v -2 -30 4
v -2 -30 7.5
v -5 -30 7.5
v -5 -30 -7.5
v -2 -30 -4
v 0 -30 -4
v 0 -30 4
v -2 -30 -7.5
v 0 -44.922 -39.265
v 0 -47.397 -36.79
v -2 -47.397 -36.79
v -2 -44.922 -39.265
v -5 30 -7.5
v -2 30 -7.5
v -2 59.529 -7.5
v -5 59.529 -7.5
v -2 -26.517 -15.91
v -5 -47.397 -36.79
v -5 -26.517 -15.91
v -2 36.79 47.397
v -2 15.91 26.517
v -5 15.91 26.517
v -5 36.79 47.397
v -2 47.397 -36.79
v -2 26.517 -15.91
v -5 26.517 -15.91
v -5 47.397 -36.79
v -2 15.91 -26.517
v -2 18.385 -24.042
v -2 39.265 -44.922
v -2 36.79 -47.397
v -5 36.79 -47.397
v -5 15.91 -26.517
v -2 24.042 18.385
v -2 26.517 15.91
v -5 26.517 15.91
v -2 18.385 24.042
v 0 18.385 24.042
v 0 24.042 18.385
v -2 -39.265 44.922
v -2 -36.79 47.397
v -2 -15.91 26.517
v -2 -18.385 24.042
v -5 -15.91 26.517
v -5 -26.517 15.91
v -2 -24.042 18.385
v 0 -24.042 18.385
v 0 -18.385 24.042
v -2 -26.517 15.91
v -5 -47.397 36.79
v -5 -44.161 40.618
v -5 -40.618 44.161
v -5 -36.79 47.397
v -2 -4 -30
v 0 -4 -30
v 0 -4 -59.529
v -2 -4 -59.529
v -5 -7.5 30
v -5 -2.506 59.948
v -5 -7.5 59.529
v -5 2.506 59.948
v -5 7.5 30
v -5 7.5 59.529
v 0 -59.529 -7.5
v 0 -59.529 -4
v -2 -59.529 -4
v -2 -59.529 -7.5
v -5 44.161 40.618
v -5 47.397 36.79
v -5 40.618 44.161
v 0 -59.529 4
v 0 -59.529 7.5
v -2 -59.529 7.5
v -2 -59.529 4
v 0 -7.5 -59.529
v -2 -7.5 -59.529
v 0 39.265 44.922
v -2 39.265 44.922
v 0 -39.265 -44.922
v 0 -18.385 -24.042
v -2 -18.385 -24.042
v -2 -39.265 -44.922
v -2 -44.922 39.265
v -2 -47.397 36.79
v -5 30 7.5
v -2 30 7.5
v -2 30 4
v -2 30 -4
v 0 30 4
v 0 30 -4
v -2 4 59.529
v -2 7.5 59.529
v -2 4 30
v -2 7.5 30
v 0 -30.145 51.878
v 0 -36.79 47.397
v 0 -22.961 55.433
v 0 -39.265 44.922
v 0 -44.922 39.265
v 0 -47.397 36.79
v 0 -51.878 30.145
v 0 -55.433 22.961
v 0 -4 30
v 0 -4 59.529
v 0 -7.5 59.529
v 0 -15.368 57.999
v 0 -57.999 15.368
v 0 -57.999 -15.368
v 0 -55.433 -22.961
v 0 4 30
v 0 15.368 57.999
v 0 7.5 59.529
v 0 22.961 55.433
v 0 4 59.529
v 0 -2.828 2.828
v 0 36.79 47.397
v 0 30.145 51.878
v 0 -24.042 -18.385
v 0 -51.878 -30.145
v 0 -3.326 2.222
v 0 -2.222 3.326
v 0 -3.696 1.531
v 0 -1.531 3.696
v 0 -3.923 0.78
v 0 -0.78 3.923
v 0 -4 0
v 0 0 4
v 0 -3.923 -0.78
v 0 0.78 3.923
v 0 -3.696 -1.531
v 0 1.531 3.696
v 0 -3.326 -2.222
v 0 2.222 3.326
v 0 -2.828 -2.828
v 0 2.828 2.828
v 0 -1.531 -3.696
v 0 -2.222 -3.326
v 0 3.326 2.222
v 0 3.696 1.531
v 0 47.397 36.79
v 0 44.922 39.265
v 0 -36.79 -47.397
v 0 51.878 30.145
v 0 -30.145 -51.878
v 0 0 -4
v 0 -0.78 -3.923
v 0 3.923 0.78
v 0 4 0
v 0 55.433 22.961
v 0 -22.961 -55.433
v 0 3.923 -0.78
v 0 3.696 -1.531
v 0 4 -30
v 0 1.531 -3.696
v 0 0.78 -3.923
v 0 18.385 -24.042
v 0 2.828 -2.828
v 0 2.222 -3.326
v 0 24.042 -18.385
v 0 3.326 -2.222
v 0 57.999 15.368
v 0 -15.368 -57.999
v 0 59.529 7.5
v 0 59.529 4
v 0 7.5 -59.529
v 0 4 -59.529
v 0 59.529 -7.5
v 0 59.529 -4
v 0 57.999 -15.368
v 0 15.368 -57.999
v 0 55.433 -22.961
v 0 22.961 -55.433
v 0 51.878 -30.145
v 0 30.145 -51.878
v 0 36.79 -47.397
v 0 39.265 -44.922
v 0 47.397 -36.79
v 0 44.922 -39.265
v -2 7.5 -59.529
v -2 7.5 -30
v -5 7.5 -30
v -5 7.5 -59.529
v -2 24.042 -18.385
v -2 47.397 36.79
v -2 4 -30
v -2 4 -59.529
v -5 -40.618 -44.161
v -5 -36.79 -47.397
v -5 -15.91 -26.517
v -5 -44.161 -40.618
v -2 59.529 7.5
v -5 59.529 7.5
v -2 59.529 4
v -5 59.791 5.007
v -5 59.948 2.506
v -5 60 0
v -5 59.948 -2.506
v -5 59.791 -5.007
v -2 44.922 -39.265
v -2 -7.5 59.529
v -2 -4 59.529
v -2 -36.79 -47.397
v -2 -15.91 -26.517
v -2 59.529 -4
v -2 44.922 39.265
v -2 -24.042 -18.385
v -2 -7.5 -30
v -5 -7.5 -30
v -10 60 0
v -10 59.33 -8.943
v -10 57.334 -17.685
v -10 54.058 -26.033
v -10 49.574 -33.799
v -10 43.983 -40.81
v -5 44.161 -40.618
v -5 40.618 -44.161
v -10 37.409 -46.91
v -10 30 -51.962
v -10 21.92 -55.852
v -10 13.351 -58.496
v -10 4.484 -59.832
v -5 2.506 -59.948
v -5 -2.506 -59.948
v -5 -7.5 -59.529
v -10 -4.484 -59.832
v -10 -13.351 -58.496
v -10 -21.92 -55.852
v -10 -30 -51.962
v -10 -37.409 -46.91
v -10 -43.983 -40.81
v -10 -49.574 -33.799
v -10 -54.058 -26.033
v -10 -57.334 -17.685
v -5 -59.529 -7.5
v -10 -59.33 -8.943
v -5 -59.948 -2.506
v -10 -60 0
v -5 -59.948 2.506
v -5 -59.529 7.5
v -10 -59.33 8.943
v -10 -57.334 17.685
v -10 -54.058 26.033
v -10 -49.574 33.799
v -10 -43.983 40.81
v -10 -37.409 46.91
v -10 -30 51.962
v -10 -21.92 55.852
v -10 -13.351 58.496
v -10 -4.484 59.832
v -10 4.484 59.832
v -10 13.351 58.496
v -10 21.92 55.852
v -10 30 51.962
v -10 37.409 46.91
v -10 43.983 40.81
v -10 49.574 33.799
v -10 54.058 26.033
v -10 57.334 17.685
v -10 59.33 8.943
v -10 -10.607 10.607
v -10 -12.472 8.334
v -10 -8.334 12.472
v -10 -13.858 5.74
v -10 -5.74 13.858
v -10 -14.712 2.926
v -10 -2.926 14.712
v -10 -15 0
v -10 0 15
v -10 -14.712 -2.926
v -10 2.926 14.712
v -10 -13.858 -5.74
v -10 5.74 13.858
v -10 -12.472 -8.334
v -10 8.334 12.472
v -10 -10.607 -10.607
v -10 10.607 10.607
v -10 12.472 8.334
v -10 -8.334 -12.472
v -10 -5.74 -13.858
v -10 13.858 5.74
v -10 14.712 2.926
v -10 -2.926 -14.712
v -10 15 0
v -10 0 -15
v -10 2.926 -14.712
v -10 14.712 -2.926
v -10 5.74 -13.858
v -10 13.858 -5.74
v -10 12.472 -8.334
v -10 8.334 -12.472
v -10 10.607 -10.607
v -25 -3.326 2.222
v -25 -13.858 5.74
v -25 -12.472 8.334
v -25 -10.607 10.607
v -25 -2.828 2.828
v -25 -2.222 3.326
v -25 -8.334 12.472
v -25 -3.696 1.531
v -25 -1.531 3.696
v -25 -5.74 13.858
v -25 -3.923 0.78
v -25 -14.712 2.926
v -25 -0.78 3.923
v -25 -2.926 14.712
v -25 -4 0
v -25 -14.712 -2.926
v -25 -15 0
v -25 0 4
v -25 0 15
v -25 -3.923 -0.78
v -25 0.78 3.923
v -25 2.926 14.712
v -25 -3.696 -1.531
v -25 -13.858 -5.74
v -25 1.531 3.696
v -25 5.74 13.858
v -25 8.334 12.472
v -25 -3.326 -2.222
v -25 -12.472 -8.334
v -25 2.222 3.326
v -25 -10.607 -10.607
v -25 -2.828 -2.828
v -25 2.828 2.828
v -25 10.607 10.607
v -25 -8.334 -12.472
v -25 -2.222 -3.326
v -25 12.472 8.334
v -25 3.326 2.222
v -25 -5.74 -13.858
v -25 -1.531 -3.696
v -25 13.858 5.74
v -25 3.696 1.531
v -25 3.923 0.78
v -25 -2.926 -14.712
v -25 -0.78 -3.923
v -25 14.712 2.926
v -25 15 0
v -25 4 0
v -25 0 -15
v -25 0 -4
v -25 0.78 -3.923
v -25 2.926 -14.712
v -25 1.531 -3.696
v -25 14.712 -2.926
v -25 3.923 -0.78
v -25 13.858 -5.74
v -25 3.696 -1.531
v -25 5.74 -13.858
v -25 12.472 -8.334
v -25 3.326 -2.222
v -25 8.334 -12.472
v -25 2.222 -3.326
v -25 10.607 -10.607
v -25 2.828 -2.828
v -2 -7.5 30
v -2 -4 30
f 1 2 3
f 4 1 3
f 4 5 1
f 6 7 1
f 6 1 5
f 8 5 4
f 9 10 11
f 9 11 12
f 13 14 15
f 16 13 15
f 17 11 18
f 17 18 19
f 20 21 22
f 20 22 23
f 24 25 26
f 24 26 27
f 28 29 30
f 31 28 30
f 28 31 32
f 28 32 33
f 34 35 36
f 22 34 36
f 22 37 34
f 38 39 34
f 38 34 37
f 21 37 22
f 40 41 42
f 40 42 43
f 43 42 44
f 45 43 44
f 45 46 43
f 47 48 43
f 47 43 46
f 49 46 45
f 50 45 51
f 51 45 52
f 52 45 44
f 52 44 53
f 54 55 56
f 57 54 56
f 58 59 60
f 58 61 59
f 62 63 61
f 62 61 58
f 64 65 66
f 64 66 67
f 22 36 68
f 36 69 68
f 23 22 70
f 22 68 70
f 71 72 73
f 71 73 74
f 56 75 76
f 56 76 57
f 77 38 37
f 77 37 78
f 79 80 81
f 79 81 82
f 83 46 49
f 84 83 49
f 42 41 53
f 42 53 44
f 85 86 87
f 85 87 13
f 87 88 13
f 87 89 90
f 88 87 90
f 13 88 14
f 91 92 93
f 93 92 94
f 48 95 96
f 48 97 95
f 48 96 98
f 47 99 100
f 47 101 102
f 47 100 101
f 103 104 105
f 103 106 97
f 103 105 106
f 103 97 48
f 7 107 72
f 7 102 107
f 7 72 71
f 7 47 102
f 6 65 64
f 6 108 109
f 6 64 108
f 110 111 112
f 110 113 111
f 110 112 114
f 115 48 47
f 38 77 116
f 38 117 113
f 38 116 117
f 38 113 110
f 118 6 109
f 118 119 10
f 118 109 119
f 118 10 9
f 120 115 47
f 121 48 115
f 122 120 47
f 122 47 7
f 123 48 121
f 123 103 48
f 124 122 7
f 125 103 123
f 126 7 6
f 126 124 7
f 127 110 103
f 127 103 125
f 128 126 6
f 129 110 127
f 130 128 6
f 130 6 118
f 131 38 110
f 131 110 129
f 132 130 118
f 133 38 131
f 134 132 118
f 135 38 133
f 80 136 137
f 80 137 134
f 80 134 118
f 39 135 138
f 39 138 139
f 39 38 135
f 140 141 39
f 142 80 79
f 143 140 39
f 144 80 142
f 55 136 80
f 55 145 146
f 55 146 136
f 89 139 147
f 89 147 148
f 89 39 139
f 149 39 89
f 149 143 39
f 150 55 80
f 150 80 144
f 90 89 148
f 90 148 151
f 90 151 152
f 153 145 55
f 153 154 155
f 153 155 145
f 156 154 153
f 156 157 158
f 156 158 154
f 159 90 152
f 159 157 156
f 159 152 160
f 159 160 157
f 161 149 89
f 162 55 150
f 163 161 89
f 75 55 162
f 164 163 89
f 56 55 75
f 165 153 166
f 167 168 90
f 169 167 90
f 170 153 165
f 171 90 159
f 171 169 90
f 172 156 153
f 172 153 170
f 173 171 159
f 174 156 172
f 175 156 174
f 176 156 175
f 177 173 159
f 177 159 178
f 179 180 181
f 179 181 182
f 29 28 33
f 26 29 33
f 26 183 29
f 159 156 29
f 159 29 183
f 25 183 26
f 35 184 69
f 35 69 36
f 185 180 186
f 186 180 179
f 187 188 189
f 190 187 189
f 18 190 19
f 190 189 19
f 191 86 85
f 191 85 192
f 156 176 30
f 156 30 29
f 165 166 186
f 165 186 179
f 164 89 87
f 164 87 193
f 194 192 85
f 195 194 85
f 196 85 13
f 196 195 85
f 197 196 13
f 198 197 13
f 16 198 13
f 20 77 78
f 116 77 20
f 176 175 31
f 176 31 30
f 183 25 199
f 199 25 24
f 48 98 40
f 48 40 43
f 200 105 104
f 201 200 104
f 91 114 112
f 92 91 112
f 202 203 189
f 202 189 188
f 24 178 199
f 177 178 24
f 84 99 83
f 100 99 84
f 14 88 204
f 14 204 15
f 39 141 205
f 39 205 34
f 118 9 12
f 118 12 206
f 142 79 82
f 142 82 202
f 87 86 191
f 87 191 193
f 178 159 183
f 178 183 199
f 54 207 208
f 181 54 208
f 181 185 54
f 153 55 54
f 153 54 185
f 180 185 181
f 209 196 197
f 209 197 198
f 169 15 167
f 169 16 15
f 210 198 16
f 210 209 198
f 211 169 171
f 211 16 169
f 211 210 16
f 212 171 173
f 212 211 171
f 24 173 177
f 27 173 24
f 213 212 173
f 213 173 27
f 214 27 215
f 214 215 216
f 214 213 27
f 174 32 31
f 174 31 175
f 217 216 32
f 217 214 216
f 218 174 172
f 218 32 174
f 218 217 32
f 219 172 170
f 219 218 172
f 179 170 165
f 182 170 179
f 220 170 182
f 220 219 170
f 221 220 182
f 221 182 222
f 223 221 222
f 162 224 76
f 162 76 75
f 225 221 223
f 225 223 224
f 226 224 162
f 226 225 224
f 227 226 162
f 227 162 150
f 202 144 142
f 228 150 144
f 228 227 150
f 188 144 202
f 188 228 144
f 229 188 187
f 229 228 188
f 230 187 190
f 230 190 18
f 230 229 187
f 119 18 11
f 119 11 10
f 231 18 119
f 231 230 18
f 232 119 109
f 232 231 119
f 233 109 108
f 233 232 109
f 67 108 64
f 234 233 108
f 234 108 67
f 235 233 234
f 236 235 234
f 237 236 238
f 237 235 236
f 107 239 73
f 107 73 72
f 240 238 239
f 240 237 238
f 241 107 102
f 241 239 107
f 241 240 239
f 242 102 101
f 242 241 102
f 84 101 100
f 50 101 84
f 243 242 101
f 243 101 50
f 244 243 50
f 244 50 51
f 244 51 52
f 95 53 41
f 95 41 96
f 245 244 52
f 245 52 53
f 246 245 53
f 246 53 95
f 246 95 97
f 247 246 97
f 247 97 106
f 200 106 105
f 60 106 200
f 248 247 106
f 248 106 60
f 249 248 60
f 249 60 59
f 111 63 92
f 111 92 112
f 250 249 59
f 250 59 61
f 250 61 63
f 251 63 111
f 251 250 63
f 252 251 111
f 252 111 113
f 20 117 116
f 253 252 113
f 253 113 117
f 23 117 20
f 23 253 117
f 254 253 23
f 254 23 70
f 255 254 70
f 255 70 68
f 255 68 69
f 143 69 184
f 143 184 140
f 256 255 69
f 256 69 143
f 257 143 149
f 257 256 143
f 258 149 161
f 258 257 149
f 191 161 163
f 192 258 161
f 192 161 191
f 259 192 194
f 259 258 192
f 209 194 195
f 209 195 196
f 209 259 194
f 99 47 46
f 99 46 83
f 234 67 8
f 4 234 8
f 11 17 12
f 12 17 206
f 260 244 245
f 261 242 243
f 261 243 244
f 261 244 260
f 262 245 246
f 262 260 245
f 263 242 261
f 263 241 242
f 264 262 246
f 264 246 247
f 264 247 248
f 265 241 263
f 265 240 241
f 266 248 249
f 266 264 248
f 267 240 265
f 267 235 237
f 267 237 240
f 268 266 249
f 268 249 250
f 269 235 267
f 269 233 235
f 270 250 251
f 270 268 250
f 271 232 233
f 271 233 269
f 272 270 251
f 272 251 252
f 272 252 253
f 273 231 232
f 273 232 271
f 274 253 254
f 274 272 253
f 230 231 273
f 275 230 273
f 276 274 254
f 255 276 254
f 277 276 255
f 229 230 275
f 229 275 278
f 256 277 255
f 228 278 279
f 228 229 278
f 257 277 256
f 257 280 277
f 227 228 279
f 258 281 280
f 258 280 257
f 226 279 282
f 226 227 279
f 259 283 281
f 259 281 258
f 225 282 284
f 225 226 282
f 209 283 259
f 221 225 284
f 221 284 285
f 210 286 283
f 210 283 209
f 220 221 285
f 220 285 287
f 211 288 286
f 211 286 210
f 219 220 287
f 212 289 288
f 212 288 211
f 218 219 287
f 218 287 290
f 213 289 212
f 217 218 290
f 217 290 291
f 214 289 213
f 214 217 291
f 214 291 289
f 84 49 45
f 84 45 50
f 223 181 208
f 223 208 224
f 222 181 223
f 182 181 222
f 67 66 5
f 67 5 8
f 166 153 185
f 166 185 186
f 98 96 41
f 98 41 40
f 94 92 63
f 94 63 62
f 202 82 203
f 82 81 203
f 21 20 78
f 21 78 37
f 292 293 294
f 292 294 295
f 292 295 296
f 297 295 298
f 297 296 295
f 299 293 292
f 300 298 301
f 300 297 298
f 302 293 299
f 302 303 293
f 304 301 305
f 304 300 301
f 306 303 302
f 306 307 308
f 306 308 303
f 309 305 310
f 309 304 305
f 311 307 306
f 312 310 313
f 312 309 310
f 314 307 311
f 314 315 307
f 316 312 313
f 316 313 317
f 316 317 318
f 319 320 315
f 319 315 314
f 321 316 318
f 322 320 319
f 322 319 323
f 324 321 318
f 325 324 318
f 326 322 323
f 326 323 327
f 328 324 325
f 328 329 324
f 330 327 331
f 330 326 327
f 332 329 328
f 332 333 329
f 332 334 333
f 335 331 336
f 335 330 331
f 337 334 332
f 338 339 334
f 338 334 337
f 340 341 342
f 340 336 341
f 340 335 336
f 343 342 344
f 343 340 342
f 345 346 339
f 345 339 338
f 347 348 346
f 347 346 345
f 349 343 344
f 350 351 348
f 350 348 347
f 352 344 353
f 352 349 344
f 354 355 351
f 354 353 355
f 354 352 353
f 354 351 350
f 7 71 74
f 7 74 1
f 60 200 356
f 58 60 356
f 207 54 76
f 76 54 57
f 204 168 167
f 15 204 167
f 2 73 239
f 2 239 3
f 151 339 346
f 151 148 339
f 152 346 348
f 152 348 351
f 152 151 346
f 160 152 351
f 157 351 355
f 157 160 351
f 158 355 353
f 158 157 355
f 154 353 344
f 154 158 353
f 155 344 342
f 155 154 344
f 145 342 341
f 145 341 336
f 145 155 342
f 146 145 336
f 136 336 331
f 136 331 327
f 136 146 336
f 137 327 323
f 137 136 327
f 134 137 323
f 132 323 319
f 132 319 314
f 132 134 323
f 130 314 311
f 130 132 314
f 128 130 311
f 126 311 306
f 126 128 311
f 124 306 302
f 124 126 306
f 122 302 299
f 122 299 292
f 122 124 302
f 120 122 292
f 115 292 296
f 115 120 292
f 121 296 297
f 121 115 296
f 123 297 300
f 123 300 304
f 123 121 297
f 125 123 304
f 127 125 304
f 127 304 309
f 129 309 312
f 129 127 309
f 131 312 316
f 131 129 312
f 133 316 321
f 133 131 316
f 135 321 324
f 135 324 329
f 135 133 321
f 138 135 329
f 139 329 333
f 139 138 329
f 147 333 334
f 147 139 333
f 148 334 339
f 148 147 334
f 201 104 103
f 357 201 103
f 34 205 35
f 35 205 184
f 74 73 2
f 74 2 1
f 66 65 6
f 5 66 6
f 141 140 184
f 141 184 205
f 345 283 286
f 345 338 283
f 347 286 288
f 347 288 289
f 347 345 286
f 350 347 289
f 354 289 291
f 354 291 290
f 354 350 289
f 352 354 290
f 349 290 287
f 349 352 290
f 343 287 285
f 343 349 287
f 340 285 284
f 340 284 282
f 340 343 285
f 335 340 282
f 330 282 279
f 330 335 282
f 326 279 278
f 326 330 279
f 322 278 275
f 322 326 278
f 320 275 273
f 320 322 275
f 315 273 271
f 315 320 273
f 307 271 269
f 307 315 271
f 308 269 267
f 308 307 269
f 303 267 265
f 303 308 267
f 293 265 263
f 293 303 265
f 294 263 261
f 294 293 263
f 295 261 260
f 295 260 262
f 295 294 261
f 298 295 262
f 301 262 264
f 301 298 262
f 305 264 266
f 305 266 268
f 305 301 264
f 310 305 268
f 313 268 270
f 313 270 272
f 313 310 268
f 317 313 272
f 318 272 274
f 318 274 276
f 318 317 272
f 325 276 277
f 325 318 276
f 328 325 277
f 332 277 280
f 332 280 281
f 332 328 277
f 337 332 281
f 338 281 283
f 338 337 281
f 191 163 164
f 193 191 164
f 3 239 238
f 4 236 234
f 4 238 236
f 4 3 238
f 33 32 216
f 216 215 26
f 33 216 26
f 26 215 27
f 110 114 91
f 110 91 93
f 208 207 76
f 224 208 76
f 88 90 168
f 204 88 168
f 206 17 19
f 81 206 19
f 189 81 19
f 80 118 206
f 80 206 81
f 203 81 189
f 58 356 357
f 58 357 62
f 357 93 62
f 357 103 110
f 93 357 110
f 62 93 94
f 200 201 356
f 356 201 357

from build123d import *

# Parameters (mm, degrees)
SKETCH2_W           = 15
SKETCH2_H           = 30
SKETCH2_W_2         = 30
SKETCH2_H_2         = 15
CUT_EXTRUDE1_DEPTH  = 5
SKETCH3_W           = 29.529404499
SKETCH3_H           = 3.5
SKETCH3_W_2         = 3.5
SKETCH3_H_2         = 29.529404499
BOSS_EXTRUDE1_DEPTH = 2


with BuildPart() as part:
    # Sketch1 → Revolve2 (revolve)
    with BuildSketch(Plane.XY):
        Polygon((0, 4), (0, 60), (-10, 60), (-10, 15), (-25, 15), (-25, 4), align=None)
    revolve(axis=Axis((0, 0, 0), (-1, 0, 0)))

    # Sketch2 → Cut-Extrude1 (cut)
    with BuildSketch(Plane(origin=(0, 0, 0), x_dir=(0, 0, -1), z_dir=(1, 0, 0))):
        Polygon((15.909902577, 26.516504294), (37.123106012, 47.72970773), (47.72970773, 37.123106012), (26.516504294, 15.909902577), align=None)
        with Locations((0, 45)):
            Rectangle(SKETCH2_W, SKETCH2_H)
        with Locations((45, 0)):
            Rectangle(SKETCH2_W_2, SKETCH2_H_2)
        Polygon((26.516504295, -15.909902577), (47.72970773, -37.123106012), (37.123106012, -47.72970773), (15.909902577, -26.516504294), align=None)
        with Locations((0, -45)):
            Rectangle(SKETCH2_W, SKETCH2_H)
        Polygon((-15.909902577, -26.516504294), (-37.123106012, -47.72970773), (-47.72970773, -37.123106012), (-26.516504294, -15.909902577), align=None)
        with Locations((-45, 0)):
            Rectangle(SKETCH2_W_2, SKETCH2_H_2)
        Polygon((-26.516504294, 15.909902577), (-47.72970773, 37.123106012), (-37.123106012, 47.72970773), (-15.909902577, 26.516504294), align=None)
    extrude(amount=-CUT_EXTRUDE1_DEPTH, mode=Mode.SUBTRACT)

    # Sketch3 → Boss-Extrude1 (add)
    with BuildSketch(Plane(origin=(0, 0, 0), x_dir=(0, 0, -1), z_dir=(1, 0, 0))):
        Polygon((-15.909902577, 26.516504294), (-36.790344742, 47.39694646), (-39.265218476, 44.922072726), (-18.384776311, 24.04163056), align=None)
        Polygon((-24.04163056, 18.384776311), (-44.922072726, 39.265218476), (-47.39694646, 36.790344742), (-26.516504294, 15.909902577), align=None)
        with Locations((-44.76470225, 5.75)):
            Rectangle(SKETCH3_W, SKETCH3_H)
        with Locations((-44.76470225, -5.75)):
            Rectangle(SKETCH3_W, SKETCH3_H)
        Polygon((-26.516504294, -15.909902577), (-47.39694646, -36.790344742), (-44.922072726, -39.265218476), (-24.04163056, -18.384776311), align=None)
        Polygon((-18.384776311, -24.04163056), (-39.265218476, -44.922072726), (-36.790344742, -47.39694646), (-15.909902577, -26.516504294), align=None)
        with Locations((-5.75, -44.76470225)):
            Rectangle(SKETCH3_W_2, SKETCH3_H_2)
        with Locations((5.75, -44.76470225)):
            Rectangle(SKETCH3_W_2, SKETCH3_H_2)
        Polygon((36.790344742, -47.39694646), (39.265218476, -44.922072726), (18.384776311, -24.04163056), (15.909902577, -26.516504294), align=None)
        Polygon((44.922072726, -39.265218476), (47.39694646, -36.790344742), (26.516504295, -15.909902577), (24.04163056, -18.384776311), align=None)
        with Locations((44.76470225, -5.75)):
            Rectangle(SKETCH3_W, SKETCH3_H)
        with Locations((44.76470225, 5.75)):
            Rectangle(SKETCH3_W, SKETCH3_H)
        Polygon((47.39694646, 36.790344742), (44.922072726, 39.265218476), (24.04163056, 18.384776311), (26.516504294, 15.909902577), align=None)
        Polygon((39.265218476, 44.922072726), (36.790344742, 47.39694646), (15.909902577, 26.516504294), (18.384776311, 24.04163056), align=None)
        with Locations((5.75, 44.76470225)):
            Rectangle(SKETCH3_W_2, SKETCH3_H_2)
        with Locations((-5.75, 44.76470225)):
            Rectangle(SKETCH3_W_2, SKETCH3_H_2)
    extrude(amount=-BOSS_EXTRUDE1_DEPTH)


solid = part.part
